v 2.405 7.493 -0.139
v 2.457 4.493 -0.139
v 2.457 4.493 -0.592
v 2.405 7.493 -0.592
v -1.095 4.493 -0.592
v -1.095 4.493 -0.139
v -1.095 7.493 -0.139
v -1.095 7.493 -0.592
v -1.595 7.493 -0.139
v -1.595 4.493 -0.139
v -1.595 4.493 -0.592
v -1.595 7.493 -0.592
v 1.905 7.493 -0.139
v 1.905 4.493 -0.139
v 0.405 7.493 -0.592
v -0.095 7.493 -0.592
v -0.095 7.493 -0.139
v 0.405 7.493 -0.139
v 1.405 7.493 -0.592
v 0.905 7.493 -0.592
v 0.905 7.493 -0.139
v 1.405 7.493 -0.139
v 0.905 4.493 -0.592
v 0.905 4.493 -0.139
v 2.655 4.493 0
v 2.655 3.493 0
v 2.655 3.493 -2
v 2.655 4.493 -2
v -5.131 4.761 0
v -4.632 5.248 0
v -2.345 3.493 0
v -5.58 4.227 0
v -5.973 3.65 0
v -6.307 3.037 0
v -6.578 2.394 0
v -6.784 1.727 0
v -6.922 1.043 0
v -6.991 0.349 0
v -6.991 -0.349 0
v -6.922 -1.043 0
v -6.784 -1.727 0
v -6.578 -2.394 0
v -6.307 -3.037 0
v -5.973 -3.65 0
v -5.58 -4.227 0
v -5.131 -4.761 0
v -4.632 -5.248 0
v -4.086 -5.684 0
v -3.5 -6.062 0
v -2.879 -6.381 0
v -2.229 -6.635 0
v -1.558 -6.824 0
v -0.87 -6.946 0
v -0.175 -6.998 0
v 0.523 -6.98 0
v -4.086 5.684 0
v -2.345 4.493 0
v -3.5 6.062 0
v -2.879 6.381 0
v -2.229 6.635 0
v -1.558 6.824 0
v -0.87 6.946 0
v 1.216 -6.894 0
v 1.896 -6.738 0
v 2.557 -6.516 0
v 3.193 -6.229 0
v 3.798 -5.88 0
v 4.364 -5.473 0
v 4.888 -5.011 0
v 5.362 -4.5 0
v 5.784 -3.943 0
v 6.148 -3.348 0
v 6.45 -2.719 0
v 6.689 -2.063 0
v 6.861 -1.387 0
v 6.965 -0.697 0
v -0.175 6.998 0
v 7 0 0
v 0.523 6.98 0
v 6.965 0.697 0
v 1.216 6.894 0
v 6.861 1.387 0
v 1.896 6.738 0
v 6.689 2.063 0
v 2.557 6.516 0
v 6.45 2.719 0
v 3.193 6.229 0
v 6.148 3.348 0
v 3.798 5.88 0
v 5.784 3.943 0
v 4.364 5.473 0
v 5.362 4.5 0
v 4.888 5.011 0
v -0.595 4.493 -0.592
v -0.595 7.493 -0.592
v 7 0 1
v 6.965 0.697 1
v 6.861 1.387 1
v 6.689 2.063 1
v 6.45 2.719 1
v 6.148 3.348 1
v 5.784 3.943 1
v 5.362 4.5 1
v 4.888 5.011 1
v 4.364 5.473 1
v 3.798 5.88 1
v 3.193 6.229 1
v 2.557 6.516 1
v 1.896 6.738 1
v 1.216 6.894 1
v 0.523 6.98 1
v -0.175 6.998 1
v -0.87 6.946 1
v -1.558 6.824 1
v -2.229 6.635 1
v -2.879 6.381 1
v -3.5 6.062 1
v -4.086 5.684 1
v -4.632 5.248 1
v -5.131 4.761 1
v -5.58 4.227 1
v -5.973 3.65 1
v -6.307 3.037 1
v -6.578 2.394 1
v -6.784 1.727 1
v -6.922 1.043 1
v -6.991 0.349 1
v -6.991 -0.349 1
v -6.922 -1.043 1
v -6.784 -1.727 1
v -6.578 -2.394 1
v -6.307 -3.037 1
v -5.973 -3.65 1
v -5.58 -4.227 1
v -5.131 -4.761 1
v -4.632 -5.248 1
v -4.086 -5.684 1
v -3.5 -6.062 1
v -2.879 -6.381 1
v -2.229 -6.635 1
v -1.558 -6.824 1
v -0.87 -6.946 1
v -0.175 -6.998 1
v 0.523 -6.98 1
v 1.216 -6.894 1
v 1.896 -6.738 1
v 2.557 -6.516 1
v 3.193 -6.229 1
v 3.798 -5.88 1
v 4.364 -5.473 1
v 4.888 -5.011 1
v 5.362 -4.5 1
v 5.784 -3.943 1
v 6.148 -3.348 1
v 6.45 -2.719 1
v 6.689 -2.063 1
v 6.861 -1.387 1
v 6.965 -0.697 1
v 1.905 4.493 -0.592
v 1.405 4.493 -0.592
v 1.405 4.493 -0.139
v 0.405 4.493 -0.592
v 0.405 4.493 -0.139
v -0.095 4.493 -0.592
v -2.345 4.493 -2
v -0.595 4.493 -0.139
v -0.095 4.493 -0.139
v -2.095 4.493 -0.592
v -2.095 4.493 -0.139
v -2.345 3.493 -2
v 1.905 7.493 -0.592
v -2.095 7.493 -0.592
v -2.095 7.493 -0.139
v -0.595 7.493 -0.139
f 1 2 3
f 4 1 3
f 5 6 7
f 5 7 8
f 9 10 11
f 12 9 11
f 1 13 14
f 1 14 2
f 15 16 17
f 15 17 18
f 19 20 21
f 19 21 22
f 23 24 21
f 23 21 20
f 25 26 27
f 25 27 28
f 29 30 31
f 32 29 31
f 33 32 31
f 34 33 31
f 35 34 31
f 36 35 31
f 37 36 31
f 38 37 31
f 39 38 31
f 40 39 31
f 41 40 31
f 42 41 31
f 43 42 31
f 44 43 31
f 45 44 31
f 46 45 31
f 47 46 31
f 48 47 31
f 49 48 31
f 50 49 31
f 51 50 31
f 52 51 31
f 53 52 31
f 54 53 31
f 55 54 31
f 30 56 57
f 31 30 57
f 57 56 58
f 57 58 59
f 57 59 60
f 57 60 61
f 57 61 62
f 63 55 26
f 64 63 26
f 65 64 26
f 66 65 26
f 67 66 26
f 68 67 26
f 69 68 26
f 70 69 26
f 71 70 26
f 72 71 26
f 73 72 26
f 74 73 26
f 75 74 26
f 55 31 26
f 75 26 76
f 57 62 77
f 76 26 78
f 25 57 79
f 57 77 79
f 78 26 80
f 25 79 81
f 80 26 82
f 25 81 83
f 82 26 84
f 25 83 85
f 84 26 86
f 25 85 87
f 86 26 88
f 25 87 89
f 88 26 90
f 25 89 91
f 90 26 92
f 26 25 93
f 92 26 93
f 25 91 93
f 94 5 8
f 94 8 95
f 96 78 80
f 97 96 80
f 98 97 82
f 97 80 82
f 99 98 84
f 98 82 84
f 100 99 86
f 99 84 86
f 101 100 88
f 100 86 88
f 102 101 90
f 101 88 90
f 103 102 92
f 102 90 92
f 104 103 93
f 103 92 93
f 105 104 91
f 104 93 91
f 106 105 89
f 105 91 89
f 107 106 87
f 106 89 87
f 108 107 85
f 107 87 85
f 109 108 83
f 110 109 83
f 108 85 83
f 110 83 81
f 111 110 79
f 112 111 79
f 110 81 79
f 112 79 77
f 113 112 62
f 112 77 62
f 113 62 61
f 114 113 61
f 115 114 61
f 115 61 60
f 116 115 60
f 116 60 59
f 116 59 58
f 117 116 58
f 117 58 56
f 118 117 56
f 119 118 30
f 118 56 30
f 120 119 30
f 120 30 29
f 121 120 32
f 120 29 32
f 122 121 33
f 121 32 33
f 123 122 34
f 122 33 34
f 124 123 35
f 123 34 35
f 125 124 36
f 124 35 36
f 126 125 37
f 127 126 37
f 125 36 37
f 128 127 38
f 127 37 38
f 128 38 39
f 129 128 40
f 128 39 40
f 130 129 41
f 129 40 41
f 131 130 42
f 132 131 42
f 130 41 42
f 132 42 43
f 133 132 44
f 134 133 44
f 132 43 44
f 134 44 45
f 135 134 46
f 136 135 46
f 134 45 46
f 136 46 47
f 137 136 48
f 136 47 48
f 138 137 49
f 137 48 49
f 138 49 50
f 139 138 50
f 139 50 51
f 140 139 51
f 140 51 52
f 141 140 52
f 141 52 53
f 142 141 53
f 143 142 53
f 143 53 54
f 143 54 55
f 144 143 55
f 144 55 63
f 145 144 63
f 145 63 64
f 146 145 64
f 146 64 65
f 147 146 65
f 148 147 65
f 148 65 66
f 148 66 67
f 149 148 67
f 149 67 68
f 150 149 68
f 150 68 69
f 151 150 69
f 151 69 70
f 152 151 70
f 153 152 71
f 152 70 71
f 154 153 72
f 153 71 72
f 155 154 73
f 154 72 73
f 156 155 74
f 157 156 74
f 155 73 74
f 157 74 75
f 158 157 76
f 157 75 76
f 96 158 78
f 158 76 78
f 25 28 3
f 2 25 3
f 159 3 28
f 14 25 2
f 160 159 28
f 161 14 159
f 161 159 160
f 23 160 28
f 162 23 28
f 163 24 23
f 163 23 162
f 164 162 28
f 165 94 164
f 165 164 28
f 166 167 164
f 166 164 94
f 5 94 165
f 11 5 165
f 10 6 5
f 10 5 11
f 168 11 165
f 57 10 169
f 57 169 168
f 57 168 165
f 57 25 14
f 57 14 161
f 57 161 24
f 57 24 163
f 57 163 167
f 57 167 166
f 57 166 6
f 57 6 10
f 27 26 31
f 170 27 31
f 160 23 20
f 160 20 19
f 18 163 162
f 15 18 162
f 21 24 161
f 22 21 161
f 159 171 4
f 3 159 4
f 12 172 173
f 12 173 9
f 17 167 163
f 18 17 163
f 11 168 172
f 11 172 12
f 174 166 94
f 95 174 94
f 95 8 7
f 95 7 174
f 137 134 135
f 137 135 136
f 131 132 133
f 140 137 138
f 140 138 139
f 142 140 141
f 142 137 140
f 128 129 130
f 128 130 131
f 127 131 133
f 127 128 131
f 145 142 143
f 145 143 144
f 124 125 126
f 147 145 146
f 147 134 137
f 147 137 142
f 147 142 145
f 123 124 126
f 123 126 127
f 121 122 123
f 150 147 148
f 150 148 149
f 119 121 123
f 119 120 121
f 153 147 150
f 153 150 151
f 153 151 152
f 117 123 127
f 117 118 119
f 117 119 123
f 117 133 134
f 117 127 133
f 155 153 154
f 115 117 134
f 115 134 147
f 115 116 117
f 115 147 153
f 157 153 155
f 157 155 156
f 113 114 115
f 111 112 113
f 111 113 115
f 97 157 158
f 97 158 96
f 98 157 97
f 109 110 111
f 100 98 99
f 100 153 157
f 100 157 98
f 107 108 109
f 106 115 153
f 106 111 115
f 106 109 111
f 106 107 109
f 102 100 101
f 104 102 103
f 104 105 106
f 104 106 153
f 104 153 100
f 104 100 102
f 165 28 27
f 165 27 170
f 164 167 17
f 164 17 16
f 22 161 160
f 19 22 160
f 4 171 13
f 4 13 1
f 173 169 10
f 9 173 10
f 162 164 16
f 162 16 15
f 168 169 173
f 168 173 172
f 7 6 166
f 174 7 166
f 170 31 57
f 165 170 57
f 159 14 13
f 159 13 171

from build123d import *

# Parameters (mm, degrees)
SKETCH1_R           = 7
BOSS_EXTRUDE1_DEPTH = 1
SKETCH2_W           = 5
SKETCH2_H           = 1
BOSS_EXTRUDE2_DEPTH = 2
SKETCH3_W           = 0.5
SKETCH3_H           = 0.452823542
BOSS_EXTRUDE3_DEPTH = 3
DRAFT9_ANGLE        = 1


with BuildPart() as part:
    # Sketch1 → Boss-Extrude1 (new body)
    with BuildSketch(Plane.XY):
        Circle(SKETCH1_R)
    extrude(amount=BOSS_EXTRUDE1_DEPTH)

    # Sketch2 → Boss-Extrude2 (add)
    with BuildSketch(Plane(origin=(0, 0, 0), x_dir=(-1, 0, 0), z_dir=(0, 0, -1))):
        with Locations((-0.154644107, 3.992933826)):
            Rectangle(SKETCH2_W, SKETCH2_H)
    extrude(amount=BOSS_EXTRUDE2_DEPTH)

    # Sketch3 → Boss-Extrude3 (add)
    with BuildSketch(Plane(origin=(0, 4.492933826, 0), x_dir=(1, 0, 0), z_dir=(0, 1, 0))):
        with Locations((1.154644107, 0.365882794)):
            Rectangle(SKETCH3_W, SKETCH3_H)
        with Locations((2.154644107, 0.365882794)):
            Rectangle(SKETCH3_W, SKETCH3_H)
        with Locations((0.154644107, 0.365882794)):
            Rectangle(SKETCH3_W, SKETCH3_H)
        with Locations((-0.845355893, 0.365882794)):
            Rectangle(SKETCH3_W, SKETCH3_H)
        with Locations((-1.845355893, 0.365882794)):
            Rectangle(SKETCH3_W, SKETCH3_H)
    extrude(amount=BOSS_EXTRUDE3_DEPTH)

    # Draft9
    draft9_faces = [part.faces().sort_by_distance(p)[0] for p in [
        (2.404644107, 5.992933826, -0.365882794),
    ]]
    draft(draft9_faces, Plane.ZX.offset(7.492933826), DRAFT9_ANGLE)


solid = part.part
